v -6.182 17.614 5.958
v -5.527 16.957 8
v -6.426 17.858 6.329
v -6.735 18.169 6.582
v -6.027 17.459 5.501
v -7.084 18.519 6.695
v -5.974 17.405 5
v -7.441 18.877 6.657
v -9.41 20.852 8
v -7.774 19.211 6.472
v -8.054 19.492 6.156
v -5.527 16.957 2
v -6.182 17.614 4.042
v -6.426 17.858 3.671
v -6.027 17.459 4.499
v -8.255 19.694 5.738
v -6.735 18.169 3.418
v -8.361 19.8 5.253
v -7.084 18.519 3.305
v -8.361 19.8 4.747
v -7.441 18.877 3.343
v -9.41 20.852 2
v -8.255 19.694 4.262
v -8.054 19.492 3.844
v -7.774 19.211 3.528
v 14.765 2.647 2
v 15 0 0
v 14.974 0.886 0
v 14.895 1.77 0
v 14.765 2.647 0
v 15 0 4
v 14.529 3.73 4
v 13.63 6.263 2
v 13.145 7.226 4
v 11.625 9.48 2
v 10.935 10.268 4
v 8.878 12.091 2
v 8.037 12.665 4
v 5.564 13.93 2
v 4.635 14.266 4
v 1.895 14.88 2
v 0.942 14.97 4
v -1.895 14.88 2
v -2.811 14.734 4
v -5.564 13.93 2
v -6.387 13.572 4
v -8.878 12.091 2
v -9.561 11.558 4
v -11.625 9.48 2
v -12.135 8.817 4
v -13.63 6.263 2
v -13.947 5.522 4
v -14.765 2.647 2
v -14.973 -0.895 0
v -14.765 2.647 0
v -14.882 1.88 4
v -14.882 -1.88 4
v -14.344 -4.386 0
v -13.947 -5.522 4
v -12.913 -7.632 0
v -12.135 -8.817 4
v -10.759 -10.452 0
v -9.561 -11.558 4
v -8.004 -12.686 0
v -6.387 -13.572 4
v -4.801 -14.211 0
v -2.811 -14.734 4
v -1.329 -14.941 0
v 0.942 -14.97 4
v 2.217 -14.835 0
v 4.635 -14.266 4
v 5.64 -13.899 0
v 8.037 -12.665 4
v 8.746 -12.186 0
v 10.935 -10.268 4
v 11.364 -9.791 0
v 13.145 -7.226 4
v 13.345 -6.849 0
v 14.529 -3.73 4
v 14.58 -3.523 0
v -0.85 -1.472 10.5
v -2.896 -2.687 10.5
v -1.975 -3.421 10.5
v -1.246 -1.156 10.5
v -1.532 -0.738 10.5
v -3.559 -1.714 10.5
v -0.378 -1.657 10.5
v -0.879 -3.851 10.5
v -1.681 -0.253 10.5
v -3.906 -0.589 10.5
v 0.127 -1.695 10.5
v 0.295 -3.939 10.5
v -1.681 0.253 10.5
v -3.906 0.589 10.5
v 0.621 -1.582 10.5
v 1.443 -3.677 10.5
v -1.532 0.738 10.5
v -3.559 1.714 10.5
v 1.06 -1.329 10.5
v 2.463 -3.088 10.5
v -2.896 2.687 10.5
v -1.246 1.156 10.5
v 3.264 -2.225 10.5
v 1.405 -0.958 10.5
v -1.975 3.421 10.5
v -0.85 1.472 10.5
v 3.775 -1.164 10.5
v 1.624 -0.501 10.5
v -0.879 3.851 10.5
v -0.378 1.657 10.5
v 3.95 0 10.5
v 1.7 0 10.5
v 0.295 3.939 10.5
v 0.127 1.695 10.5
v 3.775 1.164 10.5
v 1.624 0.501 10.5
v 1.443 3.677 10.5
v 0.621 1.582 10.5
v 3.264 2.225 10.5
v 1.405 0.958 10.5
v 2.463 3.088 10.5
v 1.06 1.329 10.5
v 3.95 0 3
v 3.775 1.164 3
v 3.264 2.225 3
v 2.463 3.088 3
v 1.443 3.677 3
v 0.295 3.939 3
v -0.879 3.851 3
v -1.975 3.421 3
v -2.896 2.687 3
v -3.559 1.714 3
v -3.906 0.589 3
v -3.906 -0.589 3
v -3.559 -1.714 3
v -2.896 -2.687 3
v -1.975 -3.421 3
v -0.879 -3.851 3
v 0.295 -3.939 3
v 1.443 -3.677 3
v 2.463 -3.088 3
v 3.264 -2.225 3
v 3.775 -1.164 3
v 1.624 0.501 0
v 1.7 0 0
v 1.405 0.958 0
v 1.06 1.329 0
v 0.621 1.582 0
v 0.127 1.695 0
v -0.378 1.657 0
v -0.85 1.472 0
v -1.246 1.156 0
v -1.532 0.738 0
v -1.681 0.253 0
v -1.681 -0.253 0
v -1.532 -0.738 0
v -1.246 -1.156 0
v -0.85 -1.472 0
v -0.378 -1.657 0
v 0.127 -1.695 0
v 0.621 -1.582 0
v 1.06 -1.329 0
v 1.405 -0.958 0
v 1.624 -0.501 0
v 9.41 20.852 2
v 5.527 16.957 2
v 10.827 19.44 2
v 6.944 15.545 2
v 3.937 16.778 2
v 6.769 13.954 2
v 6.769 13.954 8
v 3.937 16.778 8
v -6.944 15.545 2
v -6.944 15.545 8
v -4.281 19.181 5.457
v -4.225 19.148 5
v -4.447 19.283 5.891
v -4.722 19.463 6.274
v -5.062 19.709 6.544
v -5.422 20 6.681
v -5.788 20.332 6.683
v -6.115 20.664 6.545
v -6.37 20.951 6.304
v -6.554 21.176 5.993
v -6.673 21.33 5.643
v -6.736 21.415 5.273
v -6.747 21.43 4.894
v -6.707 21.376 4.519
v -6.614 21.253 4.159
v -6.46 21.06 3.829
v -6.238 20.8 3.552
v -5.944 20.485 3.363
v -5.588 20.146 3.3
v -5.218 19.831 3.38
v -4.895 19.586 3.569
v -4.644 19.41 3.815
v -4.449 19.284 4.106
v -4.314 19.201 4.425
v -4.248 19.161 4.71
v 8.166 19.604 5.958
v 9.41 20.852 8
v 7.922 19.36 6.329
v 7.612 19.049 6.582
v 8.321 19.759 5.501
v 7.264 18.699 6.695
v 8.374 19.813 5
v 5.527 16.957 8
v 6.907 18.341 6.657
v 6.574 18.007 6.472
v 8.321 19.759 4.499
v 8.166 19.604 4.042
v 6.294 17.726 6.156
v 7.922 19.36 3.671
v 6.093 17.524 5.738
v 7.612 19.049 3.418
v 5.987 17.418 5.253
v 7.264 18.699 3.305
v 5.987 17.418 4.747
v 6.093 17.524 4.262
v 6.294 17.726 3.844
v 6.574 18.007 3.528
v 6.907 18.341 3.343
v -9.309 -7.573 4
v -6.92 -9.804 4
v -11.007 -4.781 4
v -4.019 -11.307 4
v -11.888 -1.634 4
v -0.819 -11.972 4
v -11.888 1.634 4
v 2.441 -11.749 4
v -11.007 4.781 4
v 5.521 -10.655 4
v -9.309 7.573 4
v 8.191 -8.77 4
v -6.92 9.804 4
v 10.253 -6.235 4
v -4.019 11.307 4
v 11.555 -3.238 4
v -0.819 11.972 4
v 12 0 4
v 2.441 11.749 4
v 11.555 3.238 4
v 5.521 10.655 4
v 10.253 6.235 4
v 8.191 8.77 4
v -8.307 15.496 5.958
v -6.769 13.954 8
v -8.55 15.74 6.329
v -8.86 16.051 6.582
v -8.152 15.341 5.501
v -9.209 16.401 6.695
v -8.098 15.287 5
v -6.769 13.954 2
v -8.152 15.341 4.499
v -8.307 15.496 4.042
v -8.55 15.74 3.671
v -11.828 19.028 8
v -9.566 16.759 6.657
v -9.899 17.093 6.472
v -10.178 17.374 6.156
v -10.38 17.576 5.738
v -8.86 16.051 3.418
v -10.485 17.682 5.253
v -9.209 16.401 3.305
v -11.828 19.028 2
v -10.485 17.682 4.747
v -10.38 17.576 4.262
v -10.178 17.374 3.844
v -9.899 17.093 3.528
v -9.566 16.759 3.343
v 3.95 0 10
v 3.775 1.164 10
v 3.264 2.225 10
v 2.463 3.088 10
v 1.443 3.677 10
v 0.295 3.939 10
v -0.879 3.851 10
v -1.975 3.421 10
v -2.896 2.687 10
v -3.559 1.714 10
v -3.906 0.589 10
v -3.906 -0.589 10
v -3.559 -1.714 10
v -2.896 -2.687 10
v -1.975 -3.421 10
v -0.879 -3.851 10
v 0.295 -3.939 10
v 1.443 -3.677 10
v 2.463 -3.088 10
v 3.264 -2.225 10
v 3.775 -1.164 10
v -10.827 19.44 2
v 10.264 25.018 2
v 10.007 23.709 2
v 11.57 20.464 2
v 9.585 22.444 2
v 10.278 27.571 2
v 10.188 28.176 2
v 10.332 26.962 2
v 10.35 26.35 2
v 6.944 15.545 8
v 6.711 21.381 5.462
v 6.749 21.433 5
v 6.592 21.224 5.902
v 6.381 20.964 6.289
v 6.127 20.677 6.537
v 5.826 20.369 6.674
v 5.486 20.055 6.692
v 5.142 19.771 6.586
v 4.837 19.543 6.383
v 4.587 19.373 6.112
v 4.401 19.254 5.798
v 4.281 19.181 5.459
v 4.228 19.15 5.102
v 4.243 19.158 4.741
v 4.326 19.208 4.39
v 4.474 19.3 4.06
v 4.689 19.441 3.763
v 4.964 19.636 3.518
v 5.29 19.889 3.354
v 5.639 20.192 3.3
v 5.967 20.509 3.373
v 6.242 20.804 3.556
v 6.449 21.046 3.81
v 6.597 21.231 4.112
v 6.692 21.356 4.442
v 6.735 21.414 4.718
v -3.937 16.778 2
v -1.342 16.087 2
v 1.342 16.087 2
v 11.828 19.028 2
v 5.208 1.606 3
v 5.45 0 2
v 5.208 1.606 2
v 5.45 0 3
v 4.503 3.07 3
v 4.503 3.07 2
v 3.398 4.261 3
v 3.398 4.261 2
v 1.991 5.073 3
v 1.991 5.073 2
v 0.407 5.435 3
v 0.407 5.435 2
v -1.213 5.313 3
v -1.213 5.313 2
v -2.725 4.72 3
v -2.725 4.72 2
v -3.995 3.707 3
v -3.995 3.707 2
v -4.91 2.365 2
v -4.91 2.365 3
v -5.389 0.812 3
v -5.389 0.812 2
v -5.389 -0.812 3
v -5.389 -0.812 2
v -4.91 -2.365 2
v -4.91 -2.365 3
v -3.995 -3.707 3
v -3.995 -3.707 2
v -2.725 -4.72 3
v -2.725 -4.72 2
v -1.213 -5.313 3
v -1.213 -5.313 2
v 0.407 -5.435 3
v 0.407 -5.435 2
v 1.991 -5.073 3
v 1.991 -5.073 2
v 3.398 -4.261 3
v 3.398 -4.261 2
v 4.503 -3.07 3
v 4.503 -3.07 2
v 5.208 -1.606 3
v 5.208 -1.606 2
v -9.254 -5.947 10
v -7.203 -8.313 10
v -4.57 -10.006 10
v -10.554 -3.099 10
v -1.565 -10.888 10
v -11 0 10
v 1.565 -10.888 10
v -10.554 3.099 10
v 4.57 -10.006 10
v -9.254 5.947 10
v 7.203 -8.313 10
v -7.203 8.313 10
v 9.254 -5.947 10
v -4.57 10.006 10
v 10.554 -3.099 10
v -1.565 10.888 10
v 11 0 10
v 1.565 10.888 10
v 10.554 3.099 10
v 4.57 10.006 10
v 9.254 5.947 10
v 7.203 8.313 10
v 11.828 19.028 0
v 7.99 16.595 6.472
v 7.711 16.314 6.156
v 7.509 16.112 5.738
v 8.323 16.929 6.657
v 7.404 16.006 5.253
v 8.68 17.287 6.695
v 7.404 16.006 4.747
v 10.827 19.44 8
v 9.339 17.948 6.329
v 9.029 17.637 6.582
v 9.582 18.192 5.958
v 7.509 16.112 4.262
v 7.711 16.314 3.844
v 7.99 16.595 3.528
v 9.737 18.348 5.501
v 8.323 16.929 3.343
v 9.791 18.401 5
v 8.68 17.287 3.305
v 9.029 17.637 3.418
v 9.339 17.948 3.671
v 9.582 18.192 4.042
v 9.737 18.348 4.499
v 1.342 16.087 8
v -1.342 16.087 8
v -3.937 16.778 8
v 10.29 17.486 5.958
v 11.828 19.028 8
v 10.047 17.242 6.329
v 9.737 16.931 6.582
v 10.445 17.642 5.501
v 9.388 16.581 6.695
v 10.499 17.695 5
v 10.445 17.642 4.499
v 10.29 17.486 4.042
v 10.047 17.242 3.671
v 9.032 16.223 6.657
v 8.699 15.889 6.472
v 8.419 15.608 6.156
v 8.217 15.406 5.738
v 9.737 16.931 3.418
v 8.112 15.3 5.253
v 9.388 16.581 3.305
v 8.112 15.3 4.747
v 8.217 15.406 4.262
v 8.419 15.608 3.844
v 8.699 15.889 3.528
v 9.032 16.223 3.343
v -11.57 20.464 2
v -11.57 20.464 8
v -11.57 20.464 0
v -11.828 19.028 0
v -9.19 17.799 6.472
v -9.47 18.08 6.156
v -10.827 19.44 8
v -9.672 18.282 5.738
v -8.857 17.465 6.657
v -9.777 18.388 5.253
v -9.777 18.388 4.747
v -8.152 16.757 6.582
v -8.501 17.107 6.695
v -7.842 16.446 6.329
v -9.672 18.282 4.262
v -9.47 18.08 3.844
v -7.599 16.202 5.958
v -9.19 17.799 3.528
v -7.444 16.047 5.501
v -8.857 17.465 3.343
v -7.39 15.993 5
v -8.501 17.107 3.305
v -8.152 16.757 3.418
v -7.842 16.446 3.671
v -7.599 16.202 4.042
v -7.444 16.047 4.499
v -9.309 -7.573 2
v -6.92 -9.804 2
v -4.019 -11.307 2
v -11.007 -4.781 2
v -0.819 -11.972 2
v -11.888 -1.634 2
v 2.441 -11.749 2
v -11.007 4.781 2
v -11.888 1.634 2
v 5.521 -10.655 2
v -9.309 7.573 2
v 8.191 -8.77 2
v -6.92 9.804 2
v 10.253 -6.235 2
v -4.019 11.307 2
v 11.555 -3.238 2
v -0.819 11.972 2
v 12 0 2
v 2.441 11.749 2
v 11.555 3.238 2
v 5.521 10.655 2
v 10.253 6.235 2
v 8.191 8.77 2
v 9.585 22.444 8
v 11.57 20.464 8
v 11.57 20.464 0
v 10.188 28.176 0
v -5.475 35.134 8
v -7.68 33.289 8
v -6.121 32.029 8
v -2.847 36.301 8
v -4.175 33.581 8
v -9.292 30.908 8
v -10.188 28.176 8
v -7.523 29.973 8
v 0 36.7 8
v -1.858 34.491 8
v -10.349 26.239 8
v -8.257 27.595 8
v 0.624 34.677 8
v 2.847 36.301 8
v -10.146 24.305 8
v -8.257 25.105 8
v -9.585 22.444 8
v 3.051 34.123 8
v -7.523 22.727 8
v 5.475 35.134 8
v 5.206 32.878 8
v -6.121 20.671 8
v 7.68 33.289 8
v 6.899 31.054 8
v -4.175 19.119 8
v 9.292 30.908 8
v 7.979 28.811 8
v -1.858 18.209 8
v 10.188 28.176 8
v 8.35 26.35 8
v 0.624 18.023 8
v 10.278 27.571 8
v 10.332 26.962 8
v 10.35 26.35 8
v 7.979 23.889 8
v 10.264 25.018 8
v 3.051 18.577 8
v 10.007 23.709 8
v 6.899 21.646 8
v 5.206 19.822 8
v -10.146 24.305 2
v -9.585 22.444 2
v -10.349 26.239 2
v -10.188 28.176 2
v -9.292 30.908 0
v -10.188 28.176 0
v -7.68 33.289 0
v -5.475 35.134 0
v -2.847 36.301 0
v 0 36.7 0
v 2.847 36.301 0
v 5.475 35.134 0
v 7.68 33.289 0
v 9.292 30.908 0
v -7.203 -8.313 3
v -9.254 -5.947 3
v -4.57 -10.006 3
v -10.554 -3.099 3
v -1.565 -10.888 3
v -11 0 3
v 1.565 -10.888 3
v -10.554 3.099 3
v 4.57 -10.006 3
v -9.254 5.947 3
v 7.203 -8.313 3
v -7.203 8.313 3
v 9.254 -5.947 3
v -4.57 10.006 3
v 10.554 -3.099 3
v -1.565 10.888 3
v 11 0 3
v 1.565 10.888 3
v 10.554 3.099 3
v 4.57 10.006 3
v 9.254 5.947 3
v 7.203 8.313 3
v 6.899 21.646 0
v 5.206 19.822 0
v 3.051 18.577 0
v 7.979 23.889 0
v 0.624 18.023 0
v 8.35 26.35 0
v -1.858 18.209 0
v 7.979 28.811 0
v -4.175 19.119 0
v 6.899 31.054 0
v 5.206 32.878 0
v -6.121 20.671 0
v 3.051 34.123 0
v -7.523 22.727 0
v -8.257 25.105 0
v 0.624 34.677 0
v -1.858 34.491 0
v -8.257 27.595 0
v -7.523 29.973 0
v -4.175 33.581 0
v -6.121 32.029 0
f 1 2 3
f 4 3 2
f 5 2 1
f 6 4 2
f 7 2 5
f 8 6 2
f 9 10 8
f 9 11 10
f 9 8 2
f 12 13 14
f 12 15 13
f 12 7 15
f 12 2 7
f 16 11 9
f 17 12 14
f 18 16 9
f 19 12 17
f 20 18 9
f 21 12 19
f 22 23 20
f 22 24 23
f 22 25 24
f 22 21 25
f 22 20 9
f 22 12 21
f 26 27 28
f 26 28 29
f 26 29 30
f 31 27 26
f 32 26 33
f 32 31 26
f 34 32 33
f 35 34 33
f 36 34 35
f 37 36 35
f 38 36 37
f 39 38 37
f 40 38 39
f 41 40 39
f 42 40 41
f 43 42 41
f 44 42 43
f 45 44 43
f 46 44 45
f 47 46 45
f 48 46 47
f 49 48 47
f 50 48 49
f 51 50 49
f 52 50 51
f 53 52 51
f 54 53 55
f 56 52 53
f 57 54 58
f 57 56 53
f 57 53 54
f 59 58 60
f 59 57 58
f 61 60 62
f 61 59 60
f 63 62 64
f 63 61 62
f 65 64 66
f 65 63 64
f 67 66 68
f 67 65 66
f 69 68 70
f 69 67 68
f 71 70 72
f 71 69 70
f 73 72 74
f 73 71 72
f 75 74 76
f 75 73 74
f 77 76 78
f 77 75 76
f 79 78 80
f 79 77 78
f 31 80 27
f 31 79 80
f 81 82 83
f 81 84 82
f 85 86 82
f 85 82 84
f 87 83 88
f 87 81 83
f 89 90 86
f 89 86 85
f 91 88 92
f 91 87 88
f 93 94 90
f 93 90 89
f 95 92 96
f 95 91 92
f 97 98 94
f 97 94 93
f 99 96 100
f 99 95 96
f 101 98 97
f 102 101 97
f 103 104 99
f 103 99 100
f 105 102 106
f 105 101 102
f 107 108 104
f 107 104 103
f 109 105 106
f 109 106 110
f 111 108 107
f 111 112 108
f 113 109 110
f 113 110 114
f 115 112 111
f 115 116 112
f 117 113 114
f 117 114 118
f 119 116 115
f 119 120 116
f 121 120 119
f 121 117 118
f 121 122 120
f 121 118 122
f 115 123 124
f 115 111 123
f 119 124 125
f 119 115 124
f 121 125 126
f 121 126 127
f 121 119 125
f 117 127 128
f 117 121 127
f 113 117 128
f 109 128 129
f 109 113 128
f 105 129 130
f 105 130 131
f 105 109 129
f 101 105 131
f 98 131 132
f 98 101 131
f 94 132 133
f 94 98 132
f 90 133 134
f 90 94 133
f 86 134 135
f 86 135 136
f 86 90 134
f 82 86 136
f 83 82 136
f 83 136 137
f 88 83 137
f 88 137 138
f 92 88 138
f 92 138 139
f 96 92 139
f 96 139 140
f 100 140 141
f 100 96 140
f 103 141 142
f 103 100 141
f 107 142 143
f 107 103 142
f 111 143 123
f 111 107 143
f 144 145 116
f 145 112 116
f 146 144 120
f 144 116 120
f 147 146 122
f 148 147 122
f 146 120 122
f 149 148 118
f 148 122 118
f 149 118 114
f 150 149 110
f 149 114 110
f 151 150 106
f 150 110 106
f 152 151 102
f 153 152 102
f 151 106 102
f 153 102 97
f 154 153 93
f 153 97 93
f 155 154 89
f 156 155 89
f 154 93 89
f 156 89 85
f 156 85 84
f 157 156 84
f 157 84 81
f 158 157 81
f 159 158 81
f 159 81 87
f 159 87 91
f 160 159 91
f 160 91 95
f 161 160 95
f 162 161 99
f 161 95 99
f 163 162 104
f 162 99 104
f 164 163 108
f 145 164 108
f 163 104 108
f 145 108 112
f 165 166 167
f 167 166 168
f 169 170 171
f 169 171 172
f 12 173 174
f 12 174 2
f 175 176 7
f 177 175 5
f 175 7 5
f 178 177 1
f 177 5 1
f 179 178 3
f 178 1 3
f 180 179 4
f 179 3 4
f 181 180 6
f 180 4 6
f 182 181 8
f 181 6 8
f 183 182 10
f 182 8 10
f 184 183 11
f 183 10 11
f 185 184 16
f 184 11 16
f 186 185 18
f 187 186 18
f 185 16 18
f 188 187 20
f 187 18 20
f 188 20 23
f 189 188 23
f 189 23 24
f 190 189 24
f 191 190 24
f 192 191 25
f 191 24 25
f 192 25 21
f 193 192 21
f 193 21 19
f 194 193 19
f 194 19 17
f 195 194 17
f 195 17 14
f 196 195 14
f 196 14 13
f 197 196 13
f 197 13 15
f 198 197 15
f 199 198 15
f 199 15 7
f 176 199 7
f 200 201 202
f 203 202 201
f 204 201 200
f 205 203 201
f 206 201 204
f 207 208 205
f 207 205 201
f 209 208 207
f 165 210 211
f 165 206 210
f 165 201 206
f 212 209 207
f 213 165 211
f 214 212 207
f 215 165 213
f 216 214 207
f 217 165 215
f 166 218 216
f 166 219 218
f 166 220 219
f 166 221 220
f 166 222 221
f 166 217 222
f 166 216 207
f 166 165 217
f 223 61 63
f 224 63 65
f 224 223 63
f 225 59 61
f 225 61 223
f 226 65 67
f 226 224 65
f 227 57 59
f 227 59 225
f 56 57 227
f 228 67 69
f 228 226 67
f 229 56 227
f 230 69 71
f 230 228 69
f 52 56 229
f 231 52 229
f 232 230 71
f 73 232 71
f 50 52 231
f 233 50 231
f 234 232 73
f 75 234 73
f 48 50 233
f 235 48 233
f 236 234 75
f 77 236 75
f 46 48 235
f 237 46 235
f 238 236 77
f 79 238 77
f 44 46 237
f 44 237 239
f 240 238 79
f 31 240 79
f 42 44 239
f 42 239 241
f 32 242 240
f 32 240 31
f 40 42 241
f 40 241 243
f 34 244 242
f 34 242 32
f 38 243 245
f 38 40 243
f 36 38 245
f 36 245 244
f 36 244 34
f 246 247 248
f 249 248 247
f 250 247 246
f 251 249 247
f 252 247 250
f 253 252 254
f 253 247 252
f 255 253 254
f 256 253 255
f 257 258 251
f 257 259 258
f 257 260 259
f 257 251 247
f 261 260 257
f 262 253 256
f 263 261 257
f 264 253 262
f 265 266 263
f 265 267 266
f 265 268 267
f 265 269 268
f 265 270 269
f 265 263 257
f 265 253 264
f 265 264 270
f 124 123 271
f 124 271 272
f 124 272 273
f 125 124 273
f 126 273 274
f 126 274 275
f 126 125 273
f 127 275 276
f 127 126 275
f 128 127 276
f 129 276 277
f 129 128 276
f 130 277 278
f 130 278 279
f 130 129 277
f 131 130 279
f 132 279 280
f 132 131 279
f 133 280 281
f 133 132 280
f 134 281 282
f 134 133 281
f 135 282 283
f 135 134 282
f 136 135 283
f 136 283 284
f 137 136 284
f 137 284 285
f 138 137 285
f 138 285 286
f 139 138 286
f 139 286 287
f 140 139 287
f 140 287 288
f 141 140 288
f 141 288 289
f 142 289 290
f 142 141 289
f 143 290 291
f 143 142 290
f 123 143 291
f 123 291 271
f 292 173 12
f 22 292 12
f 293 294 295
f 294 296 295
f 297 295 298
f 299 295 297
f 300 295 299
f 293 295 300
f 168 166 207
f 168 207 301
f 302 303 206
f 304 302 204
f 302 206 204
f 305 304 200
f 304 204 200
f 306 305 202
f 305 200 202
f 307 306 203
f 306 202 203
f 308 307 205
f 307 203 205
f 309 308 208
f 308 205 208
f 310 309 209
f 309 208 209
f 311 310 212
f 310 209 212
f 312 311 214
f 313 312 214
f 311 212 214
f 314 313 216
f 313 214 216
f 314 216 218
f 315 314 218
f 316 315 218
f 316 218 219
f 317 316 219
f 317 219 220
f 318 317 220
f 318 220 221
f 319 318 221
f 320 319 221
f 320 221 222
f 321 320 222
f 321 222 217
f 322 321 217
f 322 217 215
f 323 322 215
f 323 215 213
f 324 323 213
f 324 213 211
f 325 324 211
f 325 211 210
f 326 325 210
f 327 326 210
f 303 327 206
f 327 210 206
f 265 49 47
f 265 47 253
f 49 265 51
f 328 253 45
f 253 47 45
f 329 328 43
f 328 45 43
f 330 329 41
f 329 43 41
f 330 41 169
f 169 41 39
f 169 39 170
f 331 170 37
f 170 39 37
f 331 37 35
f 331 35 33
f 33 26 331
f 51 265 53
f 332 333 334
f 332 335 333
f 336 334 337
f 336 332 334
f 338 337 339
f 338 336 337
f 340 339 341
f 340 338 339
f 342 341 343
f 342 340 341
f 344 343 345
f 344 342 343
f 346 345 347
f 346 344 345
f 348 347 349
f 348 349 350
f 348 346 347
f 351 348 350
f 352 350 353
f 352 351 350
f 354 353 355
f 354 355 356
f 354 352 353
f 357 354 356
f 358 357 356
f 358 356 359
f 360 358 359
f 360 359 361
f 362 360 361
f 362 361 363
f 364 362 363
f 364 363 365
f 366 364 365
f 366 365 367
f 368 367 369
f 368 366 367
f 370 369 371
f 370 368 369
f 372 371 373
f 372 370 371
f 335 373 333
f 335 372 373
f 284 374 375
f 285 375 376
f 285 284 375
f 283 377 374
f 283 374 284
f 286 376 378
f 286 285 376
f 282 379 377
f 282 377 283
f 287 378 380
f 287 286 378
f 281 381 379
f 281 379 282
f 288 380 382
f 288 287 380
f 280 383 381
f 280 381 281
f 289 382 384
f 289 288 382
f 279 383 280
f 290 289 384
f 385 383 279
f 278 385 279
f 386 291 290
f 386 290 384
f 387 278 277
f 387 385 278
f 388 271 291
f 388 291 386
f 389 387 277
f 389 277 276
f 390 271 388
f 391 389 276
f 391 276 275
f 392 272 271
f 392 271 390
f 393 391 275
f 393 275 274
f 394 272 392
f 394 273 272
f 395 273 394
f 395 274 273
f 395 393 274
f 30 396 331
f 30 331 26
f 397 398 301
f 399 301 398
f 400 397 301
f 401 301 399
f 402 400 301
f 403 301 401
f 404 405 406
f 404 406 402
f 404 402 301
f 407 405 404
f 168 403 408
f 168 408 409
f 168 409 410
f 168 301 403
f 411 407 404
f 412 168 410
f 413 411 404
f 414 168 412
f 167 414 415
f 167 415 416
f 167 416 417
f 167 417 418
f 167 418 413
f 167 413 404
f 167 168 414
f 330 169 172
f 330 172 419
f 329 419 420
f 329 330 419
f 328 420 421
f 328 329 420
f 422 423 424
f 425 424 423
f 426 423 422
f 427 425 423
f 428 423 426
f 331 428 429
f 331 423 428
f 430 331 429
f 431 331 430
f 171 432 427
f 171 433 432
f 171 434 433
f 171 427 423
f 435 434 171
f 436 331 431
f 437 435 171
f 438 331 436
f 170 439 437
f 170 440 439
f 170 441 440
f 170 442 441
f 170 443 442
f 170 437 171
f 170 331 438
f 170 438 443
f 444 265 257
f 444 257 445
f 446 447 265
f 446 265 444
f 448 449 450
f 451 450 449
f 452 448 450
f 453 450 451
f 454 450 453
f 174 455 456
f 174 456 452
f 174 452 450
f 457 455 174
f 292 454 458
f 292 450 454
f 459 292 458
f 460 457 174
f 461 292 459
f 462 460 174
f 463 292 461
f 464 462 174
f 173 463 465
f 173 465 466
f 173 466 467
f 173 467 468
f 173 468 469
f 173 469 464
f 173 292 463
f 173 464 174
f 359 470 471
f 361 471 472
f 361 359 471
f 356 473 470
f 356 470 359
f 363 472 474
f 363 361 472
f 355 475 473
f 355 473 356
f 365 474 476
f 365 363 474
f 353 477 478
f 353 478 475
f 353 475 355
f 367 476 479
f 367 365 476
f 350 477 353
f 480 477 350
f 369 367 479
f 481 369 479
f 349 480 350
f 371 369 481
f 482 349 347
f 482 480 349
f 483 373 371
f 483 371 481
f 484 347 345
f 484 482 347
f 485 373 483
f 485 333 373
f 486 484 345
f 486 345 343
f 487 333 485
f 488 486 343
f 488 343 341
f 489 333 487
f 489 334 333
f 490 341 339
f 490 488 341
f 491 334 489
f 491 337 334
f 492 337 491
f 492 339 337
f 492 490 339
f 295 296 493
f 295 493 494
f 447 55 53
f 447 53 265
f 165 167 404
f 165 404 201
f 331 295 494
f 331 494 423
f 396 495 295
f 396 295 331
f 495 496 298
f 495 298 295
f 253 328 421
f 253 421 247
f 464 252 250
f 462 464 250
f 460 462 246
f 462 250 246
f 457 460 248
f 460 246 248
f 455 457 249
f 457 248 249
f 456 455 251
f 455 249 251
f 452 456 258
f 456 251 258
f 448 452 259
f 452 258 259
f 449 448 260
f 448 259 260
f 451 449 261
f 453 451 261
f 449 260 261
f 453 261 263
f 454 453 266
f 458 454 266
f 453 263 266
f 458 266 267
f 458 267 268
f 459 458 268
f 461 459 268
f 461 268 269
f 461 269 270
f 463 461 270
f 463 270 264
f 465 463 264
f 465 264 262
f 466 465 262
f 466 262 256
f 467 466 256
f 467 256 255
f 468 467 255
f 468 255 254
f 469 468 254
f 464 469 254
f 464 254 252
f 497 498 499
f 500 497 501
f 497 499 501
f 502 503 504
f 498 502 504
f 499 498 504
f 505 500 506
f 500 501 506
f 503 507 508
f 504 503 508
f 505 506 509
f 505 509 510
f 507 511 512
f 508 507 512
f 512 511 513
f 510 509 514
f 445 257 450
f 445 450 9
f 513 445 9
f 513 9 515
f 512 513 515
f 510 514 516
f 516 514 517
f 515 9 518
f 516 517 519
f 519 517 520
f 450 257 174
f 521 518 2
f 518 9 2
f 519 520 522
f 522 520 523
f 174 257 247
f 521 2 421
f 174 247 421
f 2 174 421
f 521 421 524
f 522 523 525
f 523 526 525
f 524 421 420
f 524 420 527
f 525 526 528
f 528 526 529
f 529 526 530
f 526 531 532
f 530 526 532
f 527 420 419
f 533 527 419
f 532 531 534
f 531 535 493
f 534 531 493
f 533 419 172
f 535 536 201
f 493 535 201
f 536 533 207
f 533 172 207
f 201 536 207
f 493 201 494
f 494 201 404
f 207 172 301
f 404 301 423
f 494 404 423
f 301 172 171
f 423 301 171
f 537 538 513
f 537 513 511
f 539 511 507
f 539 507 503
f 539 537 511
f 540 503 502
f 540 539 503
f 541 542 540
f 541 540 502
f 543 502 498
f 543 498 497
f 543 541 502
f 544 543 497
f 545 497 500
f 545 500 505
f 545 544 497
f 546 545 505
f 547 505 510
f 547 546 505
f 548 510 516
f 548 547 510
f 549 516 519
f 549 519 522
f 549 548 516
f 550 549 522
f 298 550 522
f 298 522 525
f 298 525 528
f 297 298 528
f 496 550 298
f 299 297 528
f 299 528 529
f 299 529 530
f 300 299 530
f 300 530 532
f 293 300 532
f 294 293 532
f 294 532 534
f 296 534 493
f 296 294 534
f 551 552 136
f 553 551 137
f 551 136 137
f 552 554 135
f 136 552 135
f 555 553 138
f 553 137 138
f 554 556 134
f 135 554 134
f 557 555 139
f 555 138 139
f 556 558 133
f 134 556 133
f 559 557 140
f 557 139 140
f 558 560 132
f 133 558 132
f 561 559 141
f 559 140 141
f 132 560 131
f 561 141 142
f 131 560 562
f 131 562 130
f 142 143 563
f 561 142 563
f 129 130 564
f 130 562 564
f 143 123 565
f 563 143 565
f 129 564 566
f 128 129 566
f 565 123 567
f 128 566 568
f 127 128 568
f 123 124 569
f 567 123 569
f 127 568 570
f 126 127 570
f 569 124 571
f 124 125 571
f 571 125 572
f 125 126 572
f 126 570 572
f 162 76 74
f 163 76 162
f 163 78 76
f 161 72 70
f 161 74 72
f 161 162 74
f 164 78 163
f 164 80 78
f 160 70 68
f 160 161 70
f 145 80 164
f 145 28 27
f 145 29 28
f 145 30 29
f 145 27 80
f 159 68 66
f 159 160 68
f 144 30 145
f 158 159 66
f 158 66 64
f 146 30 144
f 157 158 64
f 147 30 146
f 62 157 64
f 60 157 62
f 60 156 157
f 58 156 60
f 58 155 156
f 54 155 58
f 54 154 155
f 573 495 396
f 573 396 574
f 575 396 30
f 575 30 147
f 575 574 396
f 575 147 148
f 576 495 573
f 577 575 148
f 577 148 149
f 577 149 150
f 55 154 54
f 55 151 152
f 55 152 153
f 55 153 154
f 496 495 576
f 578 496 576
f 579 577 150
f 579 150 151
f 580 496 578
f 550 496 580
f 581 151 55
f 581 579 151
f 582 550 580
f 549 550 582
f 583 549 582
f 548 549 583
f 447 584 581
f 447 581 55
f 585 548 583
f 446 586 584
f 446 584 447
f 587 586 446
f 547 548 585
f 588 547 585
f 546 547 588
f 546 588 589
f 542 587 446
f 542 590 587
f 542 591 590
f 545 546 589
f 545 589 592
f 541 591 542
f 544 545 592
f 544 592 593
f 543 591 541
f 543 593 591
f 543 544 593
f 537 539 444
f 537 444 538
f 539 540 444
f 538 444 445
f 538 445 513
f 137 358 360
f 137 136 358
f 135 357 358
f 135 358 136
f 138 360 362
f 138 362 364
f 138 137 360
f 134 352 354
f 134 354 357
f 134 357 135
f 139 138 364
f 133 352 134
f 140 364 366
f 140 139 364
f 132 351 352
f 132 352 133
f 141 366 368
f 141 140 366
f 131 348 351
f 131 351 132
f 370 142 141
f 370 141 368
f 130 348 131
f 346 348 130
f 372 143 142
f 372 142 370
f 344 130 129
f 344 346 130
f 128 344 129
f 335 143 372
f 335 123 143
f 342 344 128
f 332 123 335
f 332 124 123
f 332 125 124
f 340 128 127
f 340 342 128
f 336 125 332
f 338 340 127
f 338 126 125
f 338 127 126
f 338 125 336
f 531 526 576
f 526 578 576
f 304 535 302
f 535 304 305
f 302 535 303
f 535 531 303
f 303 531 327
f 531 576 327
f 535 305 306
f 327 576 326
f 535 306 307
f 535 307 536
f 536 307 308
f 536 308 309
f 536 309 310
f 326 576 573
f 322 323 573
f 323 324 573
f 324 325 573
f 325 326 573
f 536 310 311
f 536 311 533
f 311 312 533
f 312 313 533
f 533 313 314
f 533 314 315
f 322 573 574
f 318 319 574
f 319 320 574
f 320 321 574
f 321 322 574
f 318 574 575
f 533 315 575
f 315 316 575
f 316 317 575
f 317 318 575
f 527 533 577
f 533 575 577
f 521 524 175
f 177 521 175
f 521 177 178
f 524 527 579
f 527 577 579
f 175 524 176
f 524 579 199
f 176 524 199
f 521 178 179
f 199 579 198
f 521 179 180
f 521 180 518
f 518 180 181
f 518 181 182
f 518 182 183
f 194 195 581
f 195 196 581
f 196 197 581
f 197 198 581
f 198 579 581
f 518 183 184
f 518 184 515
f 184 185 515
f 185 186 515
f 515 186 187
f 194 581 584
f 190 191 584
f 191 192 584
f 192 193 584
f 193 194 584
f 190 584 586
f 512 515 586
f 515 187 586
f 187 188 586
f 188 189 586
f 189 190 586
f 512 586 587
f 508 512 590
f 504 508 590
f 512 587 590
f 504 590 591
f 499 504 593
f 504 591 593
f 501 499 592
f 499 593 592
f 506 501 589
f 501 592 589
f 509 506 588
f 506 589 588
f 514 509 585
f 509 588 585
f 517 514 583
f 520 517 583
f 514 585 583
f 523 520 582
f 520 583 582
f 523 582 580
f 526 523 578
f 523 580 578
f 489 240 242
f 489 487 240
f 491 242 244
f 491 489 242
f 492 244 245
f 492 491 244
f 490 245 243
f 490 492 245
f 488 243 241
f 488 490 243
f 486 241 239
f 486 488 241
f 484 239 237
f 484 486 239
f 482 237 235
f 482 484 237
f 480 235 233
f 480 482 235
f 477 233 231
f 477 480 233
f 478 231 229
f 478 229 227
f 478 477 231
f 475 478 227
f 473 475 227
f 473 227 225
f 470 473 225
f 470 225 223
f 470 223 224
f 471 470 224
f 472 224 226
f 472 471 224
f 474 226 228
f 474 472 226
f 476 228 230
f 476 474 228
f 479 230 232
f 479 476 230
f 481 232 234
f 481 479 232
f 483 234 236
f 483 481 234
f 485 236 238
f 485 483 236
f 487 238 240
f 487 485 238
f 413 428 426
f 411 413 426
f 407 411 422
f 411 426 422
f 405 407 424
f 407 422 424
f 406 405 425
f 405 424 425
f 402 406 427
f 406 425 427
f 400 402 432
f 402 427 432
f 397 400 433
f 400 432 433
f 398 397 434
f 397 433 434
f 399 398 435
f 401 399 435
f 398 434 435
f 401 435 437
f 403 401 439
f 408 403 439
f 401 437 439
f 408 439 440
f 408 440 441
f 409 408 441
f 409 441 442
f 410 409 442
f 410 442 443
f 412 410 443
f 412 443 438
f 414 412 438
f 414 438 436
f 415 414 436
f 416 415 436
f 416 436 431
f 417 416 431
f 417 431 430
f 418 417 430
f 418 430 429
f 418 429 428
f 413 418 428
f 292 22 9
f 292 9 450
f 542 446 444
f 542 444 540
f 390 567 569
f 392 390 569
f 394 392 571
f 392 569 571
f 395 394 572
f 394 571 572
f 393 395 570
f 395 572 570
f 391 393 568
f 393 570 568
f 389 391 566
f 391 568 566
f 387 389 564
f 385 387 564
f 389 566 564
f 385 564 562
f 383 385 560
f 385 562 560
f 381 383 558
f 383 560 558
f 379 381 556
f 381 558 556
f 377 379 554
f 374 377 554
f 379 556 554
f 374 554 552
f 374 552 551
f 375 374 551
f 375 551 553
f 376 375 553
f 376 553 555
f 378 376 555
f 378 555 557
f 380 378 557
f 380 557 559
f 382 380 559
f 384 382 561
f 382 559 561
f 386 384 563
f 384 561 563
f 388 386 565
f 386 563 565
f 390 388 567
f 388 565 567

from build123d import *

# Parameters (mm, degrees)
F3_R         = 1.7
F4_DEPTH     = 10.5
F5_R         = 8.35
F5_R_2       = 1.7
F2_FACE1_R   = 15
F2_FACE1_R_2 = 1.7
F6_DEPTH     = 2
F7_DEPTH     = 8
F8_R         = 1.7
F9_DEPTH     = 6.4687966713
F10_R        = 1.7
F11_DEPTH    = 6.4687966703
F12_R        = 11
F12_R_2      = 3.95
F13_DEPTH    = 7


with BuildPart() as f2:
    # F1 (on Front) → F2 (revolve)
    with BuildSketch(Plane.XZ):
        Polygon((0, 10.5), (0, 0), (15, 0), (15, 4), (12, 4), (12, 2), (11, 2), (5.45, 2), (5.45, 3), (3.95, 3), (3.95, 10.5), align=None)
    revolve(axis=Axis((0, 0, 5.25), (0, 0, 1)))

    # F3 (on face) → F4 (cut, through all)
    with BuildSketch(Plane.XY.offset(10.5)):
        Circle(F3_R)
    extrude(amount=-F4_DEPTH, mode=Mode.SUBTRACT)

    # F5 (on face) + F2_face1 (on face) → F6 (join, through all)
    with BuildSketch(Plane(origin=(0, 0, 0), x_dir=(1, 0, 0), z_dir=(0, 0, -1))):
        with BuildLine():
            ThreePointArc((14.7645887035, -2.6470588235), (0, -15), (-14.7645887035, -2.6470588235))
            Line((-14.7645887035, -2.6470588235), (-11.8277186488, -19.0281373429))
            Line((-11.8277186488, -19.0281373429), (-6.769480635, -13.9539071991))
            Line((-6.769480635, -13.9539071991), (-3.9365929167, -16.7778666846))
            ThreePointArc((-3.9365929167, -16.7778666846), (0, -16), (3.9365929167, -16.7778666846))
            Line((3.9365929167, -16.7778666846), (6.769480635, -13.9539071991))
            Line((6.769480635, -13.9539071991), (11.8277186488, -19.0281373429))
            Line((11.8277186488, -19.0281373429), (14.7645887035, -2.6470588235))
        make_face()
        with BuildLine():
            Line((11.5702645211, -20.4641478586), (11.8277186488, -19.0281373429))
            Line((11.8277186488, -19.0281373429), (6.769480635, -13.9539071991))
            Line((6.769480635, -13.9539071991), (3.9365929167, -16.7778666846))
            ThreePointArc((3.9365929167, -16.7778666846), (7.3300969712, -19.0430048314), (9.5845118876, -22.4436421212))
            Line((9.5845118876, -22.4436421212), (11.5702645211, -20.4641478586))
        make_face()
        Polygon((9.4102464779, -20.8523748379), (5.5273021855, -16.9571542252), (6.9437460446, -15.5451744825), (10.8266903371, -19.4403950952), align=None, mode=Mode.SUBTRACT)
        with BuildLine():
            Line((10.1875662054, -28.1764705882), (11.5702645211, -20.4641478586))
            Line((11.5702645211, -20.4641478586), (9.5845118876, -22.4436421212))
            ThreePointArc((9.5845118876, -22.4436421212), (10.1568252431, -24.359673147), (10.35, -26.35))
            ThreePointArc((10.35, -26.35), (10.3093115732, -27.2668396189), (10.1875662054, -28.1764705882))
        make_face()
        with BuildLine():
            ThreePointArc((-9.5845118876, -22.4436421212), (-10.2932064289, -25.2672251329), (-10.1875662054, -28.1764705882))
            ThreePointArc((-10.1875662054, -28.1764705882), (0, -36.7), (10.1875662054, -28.1764705882))
            ThreePointArc((10.1875662054, -28.1764705882), (10.3093115732, -27.2668396189), (10.35, -26.35))
            ThreePointArc((10.35, -26.35), (10.1568252431, -24.359673147), (9.5845118876, -22.4436421212))
            ThreePointArc((9.5845118876, -22.4436421212), (7.3300969712, -19.0430048314), (3.9365929167, -16.7778666846))
            ThreePointArc((3.9365929167, -16.7778666846), (0, -16), (-3.9365929167, -16.7778666846))
            ThreePointArc((-3.9365929167, -16.7778666846), (-7.3300969712, -19.0430048314), (-9.5845118876, -22.4436421212))
        make_face()
        with Locations((0, -26.35)):
            Circle(F5_R, mode=Mode.SUBTRACT)
        with BuildLine():
            Line((-6.769480635, -13.9539071991), (-11.8277186488, -19.0281373429))
            Line((-11.8277186488, -19.0281373429), (-11.5702645211, -20.4641478586))
            Line((-11.5702645211, -20.4641478586), (-9.5845118876, -22.4436421212))
            ThreePointArc((-9.5845118876, -22.4436421212), (-7.3300969712, -19.0430048314), (-3.9365929167, -16.7778666846))
            Line((-3.9365929167, -16.7778666846), (-6.769480635, -13.9539071991))
        make_face()
        Polygon((-5.5273021855, -16.9571542252), (-9.4102464779, -20.8523748379), (-10.8266903371, -19.4403950952), (-6.9437460446, -15.5451744825), align=None, mode=Mode.SUBTRACT)
        Polygon((-10.8266903371, -19.4403950952), (-9.4102464779, -20.8523748379), (-5.5273021855, -16.9571542252), (-6.9437460446, -15.5451744825), align=None)
        with BuildLine():
            Line((-9.5845118876, -22.4436421212), (-11.5702645211, -20.4641478586))
            Line((-11.5702645211, -20.4641478586), (-10.1875662054, -28.1764705882))
            ThreePointArc((-10.1875662054, -28.1764705882), (-10.2932064289, -25.2672251329), (-9.5845118876, -22.4436421212))
        make_face()
        with BuildLine():
            ThreePointArc((14.7645887035, -2.6470588235), (14.9410312655, -1.3287530709), (15, 0))
            ThreePointArc((15, 0), (-1.3287530709, 14.9410312655), (-14.7645887035, -2.6470588235))
            ThreePointArc((-14.7645887035, -2.6470588235), (0, -15), (14.7645887035, -2.6470588235))
        make_face()
        Circle(F5_R_2, mode=Mode.SUBTRACT)
        Polygon((6.9437460446, -15.5451744825), (5.5273021855, -16.9571542252), (9.4102464779, -20.8523748379), (10.8266903371, -19.4403950952), align=None)
    with BuildSketch(Plane(origin=(0, 0, 0), x_dir=(1, 0, 0), z_dir=(0, 0, -1))):
        Circle(F2_FACE1_R)
        Circle(F2_FACE1_R_2, mode=Mode.SUBTRACT)
    extrude(amount=-F6_DEPTH)

    # F5 (on face) → F7 (join)
    with BuildSketch(Plane(origin=(0, 0, 0), x_dir=(1, 0, 0), z_dir=(0, 0, -1))):
        with BuildLine():
            ThreePointArc((-9.5845118876, -22.4436421212), (-10.2932064289, -25.2672251329), (-10.1875662054, -28.1764705882))
            ThreePointArc((-10.1875662054, -28.1764705882), (0, -36.7), (10.1875662054, -28.1764705882))
            ThreePointArc((10.1875662054, -28.1764705882), (10.3093115732, -27.2668396189), (10.35, -26.35))
            ThreePointArc((10.35, -26.35), (10.1568252431, -24.359673147), (9.5845118876, -22.4436421212))
            ThreePointArc((9.5845118876, -22.4436421212), (7.3300969712, -19.0430048314), (3.9365929167, -16.7778666846))
            ThreePointArc((3.9365929167, -16.7778666846), (0, -16), (-3.9365929167, -16.7778666846))
            ThreePointArc((-3.9365929167, -16.7778666846), (-7.3300969712, -19.0430048314), (-9.5845118876, -22.4436421212))
        make_face()
        with Locations((0, -26.35)):
            Circle(F5_R, mode=Mode.SUBTRACT)
        with BuildLine():
            Line((-6.769480635, -13.9539071991), (-11.8277186488, -19.0281373429))
            Line((-11.8277186488, -19.0281373429), (-11.5702645211, -20.4641478586))
            Line((-11.5702645211, -20.4641478586), (-9.5845118876, -22.4436421212))
            ThreePointArc((-9.5845118876, -22.4436421212), (-7.3300969712, -19.0430048314), (-3.9365929167, -16.7778666846))
            Line((-3.9365929167, -16.7778666846), (-6.769480635, -13.9539071991))
        make_face()
        Polygon((-5.5273021855, -16.9571542252), (-9.4102464779, -20.8523748379), (-10.8266903371, -19.4403950952), (-6.9437460446, -15.5451744825), align=None, mode=Mode.SUBTRACT)
        with BuildLine():
            Line((11.5702645211, -20.4641478586), (11.8277186488, -19.0281373429))
            Line((11.8277186488, -19.0281373429), (6.769480635, -13.9539071991))
            Line((6.769480635, -13.9539071991), (3.9365929167, -16.7778666846))
            ThreePointArc((3.9365929167, -16.7778666846), (7.3300969712, -19.0430048314), (9.5845118876, -22.4436421212))
            Line((9.5845118876, -22.4436421212), (11.5702645211, -20.4641478586))
        make_face()
        Polygon((9.4102464779, -20.8523748379), (5.5273021855, -16.9571542252), (6.9437460446, -15.5451744825), (10.8266903371, -19.4403950952), align=None, mode=Mode.SUBTRACT)
    extrude(amount=-F7_DEPTH)

    # F8 (on face) → F9 (cut, up to face)
    with BuildSketch(Plane(origin=(3.5814942406, 3.5702066719, 0), x_dir=(0.7059898714, -0.7082219296, 0), z_dir=(-0.7082219296, -0.7059898714, 0))):
        with Locations((-18.2440207785, 5)):
            Circle(F8_R)
    extrude(amount=-F9_DEPTH, mode=Mode.SUBTRACT)

    # F10 (on face) → F11 (cut, up to face)
    with BuildSketch(Plane(origin=(-3.5814942406, 3.5702066719, 0), x_dir=(0.7059898714, 0.7082219296, 0), z_dir=(0.7082219296, -0.7059898714, 0))):
        with Locations((18.2440207785, 5)):
            Circle(F10_R)
    extrude(amount=-F11_DEPTH, mode=Mode.SUBTRACT)


with BuildPart() as f13:
    # F12 (on face) → F13 (new body)
    with BuildSketch(Plane.XY.offset(3)):
        Circle(F12_R)
        Circle(F12_R_2, mode=Mode.SUBTRACT)
    extrude(amount=F13_DEPTH)


solid = Compound([f2.part, f13.part])
